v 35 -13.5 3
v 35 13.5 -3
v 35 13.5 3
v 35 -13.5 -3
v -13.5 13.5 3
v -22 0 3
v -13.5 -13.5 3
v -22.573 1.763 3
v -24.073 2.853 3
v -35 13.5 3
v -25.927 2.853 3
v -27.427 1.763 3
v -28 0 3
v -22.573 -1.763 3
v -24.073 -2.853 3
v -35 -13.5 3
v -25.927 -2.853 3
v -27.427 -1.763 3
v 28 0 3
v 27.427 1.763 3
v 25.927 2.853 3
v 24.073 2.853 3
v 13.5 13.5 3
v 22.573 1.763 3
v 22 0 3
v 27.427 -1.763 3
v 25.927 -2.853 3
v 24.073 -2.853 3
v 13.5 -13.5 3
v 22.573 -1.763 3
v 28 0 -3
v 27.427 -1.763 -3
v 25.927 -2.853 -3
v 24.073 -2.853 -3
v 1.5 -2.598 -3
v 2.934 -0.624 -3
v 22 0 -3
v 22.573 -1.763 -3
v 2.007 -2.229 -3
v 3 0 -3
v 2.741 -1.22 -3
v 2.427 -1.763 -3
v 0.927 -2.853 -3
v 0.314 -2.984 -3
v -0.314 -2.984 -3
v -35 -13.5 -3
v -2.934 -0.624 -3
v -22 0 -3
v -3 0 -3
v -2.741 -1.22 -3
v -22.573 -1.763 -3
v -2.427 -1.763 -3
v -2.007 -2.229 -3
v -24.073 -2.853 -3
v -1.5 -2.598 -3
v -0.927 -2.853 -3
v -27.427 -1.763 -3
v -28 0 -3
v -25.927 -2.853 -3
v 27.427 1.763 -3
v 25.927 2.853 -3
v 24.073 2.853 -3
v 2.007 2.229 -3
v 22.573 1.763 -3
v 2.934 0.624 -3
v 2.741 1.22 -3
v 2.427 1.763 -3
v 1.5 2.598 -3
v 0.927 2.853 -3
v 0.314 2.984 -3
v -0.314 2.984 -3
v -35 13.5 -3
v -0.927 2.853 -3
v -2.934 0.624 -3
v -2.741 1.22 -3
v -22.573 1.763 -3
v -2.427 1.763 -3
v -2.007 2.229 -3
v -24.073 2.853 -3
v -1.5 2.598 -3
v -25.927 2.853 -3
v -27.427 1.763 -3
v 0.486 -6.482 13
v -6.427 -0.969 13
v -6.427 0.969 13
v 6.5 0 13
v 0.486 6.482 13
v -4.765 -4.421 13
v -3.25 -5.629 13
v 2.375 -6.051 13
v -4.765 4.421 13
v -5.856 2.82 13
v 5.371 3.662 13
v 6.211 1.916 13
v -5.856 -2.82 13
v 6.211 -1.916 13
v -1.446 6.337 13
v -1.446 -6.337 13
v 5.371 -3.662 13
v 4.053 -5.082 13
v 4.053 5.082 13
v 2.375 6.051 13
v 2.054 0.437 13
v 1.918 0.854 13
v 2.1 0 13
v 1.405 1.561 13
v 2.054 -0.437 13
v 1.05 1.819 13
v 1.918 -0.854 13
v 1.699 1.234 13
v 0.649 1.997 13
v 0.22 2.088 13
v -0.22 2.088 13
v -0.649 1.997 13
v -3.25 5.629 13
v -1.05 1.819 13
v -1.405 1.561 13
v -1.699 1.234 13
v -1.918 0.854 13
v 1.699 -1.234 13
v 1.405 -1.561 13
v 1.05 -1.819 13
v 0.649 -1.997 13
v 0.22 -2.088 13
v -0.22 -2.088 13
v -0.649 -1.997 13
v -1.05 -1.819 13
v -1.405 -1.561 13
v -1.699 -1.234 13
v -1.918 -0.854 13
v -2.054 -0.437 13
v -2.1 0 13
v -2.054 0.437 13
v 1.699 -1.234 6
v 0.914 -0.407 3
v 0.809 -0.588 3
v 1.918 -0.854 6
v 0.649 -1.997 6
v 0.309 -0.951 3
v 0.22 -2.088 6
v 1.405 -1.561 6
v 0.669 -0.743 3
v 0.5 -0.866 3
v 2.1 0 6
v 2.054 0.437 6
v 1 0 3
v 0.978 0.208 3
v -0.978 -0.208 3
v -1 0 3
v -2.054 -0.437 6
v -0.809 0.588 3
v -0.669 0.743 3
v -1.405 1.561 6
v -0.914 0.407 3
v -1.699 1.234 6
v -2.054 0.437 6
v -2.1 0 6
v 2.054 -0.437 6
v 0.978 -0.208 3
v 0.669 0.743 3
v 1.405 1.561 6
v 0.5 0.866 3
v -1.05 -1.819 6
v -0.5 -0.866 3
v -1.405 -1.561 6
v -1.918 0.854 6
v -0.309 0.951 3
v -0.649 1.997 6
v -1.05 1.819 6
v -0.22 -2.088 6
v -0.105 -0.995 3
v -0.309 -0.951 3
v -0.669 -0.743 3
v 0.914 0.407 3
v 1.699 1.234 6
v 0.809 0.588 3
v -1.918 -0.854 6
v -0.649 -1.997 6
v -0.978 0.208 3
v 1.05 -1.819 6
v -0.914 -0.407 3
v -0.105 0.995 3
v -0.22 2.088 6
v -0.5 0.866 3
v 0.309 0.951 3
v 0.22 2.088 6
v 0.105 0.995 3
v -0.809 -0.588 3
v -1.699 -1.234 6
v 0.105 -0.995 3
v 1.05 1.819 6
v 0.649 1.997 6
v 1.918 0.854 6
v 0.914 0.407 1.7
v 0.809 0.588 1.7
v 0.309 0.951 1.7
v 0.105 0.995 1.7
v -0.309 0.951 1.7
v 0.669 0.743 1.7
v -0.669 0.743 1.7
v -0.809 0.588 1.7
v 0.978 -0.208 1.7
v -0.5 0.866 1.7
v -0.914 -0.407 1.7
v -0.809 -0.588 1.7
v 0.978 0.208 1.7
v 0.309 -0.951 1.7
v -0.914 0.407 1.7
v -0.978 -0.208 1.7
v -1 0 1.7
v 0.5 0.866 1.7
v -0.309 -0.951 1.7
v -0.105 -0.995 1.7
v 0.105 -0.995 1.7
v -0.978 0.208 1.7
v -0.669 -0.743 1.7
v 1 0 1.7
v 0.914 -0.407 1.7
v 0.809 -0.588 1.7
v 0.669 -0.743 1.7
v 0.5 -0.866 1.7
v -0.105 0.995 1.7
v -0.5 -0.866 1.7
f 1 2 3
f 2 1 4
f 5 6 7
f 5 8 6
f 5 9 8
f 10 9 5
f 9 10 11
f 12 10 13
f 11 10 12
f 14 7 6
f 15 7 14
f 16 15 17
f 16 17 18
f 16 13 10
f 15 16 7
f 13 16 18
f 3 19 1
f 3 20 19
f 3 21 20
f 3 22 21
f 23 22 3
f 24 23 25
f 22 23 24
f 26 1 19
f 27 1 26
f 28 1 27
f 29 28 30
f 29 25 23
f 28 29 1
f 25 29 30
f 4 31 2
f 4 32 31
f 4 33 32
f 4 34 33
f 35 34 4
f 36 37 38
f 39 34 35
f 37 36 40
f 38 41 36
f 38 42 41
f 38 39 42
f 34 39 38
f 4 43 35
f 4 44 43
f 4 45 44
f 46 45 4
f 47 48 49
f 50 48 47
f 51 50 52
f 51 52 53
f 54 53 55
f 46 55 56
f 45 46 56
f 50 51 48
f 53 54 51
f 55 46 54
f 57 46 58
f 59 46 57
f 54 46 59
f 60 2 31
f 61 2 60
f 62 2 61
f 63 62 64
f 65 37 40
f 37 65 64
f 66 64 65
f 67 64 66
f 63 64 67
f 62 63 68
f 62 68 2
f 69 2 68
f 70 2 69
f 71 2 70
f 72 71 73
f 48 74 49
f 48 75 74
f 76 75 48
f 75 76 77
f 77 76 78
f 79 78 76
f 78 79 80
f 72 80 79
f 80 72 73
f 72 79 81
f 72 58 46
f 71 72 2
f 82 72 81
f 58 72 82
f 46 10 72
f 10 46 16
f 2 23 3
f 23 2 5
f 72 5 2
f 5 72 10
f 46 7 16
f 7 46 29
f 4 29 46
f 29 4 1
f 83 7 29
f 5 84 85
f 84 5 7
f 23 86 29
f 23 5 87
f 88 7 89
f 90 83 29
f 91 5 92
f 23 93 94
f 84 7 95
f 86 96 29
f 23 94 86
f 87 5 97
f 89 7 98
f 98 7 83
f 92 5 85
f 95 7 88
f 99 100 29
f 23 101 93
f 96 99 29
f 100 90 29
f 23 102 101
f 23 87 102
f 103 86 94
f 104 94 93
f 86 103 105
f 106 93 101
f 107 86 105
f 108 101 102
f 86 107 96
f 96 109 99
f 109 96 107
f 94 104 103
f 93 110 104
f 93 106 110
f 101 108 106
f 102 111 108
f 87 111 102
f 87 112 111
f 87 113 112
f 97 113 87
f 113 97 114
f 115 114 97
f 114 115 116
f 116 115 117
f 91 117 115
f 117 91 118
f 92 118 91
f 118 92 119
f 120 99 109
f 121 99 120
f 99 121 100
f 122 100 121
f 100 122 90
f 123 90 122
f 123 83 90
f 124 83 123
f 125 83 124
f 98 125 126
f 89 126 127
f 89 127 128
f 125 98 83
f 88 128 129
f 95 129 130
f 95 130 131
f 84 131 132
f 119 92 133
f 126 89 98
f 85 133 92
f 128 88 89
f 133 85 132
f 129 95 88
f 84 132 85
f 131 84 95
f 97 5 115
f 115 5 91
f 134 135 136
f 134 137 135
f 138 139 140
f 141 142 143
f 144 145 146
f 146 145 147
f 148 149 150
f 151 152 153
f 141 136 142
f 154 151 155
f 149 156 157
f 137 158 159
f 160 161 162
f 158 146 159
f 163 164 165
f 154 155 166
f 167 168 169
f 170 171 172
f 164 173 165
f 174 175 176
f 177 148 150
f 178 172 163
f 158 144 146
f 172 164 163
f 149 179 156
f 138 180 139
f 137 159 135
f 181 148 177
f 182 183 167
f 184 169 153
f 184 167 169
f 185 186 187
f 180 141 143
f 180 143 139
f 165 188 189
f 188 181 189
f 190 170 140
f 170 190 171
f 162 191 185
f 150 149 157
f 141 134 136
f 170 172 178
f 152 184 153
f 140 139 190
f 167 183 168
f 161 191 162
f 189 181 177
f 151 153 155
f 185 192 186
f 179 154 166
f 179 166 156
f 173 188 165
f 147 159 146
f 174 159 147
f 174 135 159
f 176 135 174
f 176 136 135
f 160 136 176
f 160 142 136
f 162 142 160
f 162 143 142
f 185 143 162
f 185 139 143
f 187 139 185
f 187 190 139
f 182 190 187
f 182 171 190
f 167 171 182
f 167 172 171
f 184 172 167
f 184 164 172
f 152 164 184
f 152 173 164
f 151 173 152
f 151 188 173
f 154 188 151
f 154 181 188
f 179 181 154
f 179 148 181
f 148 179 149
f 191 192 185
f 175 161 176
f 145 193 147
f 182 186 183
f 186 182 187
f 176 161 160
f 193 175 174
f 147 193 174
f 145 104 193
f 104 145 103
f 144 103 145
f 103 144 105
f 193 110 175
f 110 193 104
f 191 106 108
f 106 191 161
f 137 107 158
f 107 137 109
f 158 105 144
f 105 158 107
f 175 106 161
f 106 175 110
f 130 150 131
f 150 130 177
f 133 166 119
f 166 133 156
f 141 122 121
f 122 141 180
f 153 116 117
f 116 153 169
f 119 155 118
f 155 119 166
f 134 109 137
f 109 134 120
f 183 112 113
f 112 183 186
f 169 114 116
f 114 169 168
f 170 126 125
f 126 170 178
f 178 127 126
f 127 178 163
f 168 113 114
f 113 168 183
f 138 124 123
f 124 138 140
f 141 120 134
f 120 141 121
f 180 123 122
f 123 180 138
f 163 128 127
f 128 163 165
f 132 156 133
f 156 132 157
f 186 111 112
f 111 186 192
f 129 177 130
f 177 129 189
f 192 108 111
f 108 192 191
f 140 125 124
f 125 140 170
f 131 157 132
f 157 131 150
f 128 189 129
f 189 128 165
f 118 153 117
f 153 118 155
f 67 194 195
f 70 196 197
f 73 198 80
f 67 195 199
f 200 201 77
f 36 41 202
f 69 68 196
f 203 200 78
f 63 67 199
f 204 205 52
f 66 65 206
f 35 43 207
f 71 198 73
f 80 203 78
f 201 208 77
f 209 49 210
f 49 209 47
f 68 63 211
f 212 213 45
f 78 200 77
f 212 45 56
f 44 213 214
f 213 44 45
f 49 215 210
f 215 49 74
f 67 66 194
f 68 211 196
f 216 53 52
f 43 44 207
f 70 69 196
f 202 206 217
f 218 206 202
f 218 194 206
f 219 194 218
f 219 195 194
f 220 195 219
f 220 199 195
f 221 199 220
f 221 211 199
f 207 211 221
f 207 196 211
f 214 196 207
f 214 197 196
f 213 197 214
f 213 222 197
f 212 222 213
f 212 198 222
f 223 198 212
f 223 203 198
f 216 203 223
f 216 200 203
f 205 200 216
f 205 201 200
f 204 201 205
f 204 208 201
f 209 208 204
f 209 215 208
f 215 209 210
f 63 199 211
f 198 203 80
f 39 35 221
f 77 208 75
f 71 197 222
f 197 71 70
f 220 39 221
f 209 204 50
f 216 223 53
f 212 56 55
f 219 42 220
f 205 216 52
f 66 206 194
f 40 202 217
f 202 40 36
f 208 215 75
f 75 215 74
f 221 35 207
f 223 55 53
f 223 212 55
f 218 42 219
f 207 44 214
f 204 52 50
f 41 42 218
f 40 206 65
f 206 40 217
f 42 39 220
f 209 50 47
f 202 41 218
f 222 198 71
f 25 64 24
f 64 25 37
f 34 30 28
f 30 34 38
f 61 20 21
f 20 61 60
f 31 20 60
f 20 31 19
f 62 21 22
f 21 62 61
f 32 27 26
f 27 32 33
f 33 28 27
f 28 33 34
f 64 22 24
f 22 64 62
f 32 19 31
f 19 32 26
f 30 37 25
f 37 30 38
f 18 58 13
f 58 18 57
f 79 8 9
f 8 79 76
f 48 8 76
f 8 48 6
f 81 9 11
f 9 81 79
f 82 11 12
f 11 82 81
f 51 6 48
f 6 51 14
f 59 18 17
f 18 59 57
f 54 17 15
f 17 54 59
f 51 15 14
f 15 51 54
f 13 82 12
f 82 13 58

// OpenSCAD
difference() {
	union(){
		cube([70, 27, 6], center=true);	// base plate
		hull() {	
			cube([27, 27, 6], center=true);	// bump for the tube fitting
			translate([0, 0, 6]) cylinder(r=6.5, h=7);
		}
	}

	translate([0, 0, 3]) cylinder(r1=1, r2=2.1, h=3, $fn=30);		// hole for the M5 push fitting
	translate([0, 0, 6]) cylinder(r=2.1, h=30, $fn=30);		// hole for the M5 push fitting
	translate([0, 0, -3]) cylinder(r1=3, r2=1, h=4.7, $fn=30);		// funnel for filament
	translate([25, 0, -4]) cylinder(r=3, h=10, $fn=10);	// mounting hole
	translate([-25, 0, -4]) cylinder(r=3, h=10, $fn=10);	// mounting hole

}
